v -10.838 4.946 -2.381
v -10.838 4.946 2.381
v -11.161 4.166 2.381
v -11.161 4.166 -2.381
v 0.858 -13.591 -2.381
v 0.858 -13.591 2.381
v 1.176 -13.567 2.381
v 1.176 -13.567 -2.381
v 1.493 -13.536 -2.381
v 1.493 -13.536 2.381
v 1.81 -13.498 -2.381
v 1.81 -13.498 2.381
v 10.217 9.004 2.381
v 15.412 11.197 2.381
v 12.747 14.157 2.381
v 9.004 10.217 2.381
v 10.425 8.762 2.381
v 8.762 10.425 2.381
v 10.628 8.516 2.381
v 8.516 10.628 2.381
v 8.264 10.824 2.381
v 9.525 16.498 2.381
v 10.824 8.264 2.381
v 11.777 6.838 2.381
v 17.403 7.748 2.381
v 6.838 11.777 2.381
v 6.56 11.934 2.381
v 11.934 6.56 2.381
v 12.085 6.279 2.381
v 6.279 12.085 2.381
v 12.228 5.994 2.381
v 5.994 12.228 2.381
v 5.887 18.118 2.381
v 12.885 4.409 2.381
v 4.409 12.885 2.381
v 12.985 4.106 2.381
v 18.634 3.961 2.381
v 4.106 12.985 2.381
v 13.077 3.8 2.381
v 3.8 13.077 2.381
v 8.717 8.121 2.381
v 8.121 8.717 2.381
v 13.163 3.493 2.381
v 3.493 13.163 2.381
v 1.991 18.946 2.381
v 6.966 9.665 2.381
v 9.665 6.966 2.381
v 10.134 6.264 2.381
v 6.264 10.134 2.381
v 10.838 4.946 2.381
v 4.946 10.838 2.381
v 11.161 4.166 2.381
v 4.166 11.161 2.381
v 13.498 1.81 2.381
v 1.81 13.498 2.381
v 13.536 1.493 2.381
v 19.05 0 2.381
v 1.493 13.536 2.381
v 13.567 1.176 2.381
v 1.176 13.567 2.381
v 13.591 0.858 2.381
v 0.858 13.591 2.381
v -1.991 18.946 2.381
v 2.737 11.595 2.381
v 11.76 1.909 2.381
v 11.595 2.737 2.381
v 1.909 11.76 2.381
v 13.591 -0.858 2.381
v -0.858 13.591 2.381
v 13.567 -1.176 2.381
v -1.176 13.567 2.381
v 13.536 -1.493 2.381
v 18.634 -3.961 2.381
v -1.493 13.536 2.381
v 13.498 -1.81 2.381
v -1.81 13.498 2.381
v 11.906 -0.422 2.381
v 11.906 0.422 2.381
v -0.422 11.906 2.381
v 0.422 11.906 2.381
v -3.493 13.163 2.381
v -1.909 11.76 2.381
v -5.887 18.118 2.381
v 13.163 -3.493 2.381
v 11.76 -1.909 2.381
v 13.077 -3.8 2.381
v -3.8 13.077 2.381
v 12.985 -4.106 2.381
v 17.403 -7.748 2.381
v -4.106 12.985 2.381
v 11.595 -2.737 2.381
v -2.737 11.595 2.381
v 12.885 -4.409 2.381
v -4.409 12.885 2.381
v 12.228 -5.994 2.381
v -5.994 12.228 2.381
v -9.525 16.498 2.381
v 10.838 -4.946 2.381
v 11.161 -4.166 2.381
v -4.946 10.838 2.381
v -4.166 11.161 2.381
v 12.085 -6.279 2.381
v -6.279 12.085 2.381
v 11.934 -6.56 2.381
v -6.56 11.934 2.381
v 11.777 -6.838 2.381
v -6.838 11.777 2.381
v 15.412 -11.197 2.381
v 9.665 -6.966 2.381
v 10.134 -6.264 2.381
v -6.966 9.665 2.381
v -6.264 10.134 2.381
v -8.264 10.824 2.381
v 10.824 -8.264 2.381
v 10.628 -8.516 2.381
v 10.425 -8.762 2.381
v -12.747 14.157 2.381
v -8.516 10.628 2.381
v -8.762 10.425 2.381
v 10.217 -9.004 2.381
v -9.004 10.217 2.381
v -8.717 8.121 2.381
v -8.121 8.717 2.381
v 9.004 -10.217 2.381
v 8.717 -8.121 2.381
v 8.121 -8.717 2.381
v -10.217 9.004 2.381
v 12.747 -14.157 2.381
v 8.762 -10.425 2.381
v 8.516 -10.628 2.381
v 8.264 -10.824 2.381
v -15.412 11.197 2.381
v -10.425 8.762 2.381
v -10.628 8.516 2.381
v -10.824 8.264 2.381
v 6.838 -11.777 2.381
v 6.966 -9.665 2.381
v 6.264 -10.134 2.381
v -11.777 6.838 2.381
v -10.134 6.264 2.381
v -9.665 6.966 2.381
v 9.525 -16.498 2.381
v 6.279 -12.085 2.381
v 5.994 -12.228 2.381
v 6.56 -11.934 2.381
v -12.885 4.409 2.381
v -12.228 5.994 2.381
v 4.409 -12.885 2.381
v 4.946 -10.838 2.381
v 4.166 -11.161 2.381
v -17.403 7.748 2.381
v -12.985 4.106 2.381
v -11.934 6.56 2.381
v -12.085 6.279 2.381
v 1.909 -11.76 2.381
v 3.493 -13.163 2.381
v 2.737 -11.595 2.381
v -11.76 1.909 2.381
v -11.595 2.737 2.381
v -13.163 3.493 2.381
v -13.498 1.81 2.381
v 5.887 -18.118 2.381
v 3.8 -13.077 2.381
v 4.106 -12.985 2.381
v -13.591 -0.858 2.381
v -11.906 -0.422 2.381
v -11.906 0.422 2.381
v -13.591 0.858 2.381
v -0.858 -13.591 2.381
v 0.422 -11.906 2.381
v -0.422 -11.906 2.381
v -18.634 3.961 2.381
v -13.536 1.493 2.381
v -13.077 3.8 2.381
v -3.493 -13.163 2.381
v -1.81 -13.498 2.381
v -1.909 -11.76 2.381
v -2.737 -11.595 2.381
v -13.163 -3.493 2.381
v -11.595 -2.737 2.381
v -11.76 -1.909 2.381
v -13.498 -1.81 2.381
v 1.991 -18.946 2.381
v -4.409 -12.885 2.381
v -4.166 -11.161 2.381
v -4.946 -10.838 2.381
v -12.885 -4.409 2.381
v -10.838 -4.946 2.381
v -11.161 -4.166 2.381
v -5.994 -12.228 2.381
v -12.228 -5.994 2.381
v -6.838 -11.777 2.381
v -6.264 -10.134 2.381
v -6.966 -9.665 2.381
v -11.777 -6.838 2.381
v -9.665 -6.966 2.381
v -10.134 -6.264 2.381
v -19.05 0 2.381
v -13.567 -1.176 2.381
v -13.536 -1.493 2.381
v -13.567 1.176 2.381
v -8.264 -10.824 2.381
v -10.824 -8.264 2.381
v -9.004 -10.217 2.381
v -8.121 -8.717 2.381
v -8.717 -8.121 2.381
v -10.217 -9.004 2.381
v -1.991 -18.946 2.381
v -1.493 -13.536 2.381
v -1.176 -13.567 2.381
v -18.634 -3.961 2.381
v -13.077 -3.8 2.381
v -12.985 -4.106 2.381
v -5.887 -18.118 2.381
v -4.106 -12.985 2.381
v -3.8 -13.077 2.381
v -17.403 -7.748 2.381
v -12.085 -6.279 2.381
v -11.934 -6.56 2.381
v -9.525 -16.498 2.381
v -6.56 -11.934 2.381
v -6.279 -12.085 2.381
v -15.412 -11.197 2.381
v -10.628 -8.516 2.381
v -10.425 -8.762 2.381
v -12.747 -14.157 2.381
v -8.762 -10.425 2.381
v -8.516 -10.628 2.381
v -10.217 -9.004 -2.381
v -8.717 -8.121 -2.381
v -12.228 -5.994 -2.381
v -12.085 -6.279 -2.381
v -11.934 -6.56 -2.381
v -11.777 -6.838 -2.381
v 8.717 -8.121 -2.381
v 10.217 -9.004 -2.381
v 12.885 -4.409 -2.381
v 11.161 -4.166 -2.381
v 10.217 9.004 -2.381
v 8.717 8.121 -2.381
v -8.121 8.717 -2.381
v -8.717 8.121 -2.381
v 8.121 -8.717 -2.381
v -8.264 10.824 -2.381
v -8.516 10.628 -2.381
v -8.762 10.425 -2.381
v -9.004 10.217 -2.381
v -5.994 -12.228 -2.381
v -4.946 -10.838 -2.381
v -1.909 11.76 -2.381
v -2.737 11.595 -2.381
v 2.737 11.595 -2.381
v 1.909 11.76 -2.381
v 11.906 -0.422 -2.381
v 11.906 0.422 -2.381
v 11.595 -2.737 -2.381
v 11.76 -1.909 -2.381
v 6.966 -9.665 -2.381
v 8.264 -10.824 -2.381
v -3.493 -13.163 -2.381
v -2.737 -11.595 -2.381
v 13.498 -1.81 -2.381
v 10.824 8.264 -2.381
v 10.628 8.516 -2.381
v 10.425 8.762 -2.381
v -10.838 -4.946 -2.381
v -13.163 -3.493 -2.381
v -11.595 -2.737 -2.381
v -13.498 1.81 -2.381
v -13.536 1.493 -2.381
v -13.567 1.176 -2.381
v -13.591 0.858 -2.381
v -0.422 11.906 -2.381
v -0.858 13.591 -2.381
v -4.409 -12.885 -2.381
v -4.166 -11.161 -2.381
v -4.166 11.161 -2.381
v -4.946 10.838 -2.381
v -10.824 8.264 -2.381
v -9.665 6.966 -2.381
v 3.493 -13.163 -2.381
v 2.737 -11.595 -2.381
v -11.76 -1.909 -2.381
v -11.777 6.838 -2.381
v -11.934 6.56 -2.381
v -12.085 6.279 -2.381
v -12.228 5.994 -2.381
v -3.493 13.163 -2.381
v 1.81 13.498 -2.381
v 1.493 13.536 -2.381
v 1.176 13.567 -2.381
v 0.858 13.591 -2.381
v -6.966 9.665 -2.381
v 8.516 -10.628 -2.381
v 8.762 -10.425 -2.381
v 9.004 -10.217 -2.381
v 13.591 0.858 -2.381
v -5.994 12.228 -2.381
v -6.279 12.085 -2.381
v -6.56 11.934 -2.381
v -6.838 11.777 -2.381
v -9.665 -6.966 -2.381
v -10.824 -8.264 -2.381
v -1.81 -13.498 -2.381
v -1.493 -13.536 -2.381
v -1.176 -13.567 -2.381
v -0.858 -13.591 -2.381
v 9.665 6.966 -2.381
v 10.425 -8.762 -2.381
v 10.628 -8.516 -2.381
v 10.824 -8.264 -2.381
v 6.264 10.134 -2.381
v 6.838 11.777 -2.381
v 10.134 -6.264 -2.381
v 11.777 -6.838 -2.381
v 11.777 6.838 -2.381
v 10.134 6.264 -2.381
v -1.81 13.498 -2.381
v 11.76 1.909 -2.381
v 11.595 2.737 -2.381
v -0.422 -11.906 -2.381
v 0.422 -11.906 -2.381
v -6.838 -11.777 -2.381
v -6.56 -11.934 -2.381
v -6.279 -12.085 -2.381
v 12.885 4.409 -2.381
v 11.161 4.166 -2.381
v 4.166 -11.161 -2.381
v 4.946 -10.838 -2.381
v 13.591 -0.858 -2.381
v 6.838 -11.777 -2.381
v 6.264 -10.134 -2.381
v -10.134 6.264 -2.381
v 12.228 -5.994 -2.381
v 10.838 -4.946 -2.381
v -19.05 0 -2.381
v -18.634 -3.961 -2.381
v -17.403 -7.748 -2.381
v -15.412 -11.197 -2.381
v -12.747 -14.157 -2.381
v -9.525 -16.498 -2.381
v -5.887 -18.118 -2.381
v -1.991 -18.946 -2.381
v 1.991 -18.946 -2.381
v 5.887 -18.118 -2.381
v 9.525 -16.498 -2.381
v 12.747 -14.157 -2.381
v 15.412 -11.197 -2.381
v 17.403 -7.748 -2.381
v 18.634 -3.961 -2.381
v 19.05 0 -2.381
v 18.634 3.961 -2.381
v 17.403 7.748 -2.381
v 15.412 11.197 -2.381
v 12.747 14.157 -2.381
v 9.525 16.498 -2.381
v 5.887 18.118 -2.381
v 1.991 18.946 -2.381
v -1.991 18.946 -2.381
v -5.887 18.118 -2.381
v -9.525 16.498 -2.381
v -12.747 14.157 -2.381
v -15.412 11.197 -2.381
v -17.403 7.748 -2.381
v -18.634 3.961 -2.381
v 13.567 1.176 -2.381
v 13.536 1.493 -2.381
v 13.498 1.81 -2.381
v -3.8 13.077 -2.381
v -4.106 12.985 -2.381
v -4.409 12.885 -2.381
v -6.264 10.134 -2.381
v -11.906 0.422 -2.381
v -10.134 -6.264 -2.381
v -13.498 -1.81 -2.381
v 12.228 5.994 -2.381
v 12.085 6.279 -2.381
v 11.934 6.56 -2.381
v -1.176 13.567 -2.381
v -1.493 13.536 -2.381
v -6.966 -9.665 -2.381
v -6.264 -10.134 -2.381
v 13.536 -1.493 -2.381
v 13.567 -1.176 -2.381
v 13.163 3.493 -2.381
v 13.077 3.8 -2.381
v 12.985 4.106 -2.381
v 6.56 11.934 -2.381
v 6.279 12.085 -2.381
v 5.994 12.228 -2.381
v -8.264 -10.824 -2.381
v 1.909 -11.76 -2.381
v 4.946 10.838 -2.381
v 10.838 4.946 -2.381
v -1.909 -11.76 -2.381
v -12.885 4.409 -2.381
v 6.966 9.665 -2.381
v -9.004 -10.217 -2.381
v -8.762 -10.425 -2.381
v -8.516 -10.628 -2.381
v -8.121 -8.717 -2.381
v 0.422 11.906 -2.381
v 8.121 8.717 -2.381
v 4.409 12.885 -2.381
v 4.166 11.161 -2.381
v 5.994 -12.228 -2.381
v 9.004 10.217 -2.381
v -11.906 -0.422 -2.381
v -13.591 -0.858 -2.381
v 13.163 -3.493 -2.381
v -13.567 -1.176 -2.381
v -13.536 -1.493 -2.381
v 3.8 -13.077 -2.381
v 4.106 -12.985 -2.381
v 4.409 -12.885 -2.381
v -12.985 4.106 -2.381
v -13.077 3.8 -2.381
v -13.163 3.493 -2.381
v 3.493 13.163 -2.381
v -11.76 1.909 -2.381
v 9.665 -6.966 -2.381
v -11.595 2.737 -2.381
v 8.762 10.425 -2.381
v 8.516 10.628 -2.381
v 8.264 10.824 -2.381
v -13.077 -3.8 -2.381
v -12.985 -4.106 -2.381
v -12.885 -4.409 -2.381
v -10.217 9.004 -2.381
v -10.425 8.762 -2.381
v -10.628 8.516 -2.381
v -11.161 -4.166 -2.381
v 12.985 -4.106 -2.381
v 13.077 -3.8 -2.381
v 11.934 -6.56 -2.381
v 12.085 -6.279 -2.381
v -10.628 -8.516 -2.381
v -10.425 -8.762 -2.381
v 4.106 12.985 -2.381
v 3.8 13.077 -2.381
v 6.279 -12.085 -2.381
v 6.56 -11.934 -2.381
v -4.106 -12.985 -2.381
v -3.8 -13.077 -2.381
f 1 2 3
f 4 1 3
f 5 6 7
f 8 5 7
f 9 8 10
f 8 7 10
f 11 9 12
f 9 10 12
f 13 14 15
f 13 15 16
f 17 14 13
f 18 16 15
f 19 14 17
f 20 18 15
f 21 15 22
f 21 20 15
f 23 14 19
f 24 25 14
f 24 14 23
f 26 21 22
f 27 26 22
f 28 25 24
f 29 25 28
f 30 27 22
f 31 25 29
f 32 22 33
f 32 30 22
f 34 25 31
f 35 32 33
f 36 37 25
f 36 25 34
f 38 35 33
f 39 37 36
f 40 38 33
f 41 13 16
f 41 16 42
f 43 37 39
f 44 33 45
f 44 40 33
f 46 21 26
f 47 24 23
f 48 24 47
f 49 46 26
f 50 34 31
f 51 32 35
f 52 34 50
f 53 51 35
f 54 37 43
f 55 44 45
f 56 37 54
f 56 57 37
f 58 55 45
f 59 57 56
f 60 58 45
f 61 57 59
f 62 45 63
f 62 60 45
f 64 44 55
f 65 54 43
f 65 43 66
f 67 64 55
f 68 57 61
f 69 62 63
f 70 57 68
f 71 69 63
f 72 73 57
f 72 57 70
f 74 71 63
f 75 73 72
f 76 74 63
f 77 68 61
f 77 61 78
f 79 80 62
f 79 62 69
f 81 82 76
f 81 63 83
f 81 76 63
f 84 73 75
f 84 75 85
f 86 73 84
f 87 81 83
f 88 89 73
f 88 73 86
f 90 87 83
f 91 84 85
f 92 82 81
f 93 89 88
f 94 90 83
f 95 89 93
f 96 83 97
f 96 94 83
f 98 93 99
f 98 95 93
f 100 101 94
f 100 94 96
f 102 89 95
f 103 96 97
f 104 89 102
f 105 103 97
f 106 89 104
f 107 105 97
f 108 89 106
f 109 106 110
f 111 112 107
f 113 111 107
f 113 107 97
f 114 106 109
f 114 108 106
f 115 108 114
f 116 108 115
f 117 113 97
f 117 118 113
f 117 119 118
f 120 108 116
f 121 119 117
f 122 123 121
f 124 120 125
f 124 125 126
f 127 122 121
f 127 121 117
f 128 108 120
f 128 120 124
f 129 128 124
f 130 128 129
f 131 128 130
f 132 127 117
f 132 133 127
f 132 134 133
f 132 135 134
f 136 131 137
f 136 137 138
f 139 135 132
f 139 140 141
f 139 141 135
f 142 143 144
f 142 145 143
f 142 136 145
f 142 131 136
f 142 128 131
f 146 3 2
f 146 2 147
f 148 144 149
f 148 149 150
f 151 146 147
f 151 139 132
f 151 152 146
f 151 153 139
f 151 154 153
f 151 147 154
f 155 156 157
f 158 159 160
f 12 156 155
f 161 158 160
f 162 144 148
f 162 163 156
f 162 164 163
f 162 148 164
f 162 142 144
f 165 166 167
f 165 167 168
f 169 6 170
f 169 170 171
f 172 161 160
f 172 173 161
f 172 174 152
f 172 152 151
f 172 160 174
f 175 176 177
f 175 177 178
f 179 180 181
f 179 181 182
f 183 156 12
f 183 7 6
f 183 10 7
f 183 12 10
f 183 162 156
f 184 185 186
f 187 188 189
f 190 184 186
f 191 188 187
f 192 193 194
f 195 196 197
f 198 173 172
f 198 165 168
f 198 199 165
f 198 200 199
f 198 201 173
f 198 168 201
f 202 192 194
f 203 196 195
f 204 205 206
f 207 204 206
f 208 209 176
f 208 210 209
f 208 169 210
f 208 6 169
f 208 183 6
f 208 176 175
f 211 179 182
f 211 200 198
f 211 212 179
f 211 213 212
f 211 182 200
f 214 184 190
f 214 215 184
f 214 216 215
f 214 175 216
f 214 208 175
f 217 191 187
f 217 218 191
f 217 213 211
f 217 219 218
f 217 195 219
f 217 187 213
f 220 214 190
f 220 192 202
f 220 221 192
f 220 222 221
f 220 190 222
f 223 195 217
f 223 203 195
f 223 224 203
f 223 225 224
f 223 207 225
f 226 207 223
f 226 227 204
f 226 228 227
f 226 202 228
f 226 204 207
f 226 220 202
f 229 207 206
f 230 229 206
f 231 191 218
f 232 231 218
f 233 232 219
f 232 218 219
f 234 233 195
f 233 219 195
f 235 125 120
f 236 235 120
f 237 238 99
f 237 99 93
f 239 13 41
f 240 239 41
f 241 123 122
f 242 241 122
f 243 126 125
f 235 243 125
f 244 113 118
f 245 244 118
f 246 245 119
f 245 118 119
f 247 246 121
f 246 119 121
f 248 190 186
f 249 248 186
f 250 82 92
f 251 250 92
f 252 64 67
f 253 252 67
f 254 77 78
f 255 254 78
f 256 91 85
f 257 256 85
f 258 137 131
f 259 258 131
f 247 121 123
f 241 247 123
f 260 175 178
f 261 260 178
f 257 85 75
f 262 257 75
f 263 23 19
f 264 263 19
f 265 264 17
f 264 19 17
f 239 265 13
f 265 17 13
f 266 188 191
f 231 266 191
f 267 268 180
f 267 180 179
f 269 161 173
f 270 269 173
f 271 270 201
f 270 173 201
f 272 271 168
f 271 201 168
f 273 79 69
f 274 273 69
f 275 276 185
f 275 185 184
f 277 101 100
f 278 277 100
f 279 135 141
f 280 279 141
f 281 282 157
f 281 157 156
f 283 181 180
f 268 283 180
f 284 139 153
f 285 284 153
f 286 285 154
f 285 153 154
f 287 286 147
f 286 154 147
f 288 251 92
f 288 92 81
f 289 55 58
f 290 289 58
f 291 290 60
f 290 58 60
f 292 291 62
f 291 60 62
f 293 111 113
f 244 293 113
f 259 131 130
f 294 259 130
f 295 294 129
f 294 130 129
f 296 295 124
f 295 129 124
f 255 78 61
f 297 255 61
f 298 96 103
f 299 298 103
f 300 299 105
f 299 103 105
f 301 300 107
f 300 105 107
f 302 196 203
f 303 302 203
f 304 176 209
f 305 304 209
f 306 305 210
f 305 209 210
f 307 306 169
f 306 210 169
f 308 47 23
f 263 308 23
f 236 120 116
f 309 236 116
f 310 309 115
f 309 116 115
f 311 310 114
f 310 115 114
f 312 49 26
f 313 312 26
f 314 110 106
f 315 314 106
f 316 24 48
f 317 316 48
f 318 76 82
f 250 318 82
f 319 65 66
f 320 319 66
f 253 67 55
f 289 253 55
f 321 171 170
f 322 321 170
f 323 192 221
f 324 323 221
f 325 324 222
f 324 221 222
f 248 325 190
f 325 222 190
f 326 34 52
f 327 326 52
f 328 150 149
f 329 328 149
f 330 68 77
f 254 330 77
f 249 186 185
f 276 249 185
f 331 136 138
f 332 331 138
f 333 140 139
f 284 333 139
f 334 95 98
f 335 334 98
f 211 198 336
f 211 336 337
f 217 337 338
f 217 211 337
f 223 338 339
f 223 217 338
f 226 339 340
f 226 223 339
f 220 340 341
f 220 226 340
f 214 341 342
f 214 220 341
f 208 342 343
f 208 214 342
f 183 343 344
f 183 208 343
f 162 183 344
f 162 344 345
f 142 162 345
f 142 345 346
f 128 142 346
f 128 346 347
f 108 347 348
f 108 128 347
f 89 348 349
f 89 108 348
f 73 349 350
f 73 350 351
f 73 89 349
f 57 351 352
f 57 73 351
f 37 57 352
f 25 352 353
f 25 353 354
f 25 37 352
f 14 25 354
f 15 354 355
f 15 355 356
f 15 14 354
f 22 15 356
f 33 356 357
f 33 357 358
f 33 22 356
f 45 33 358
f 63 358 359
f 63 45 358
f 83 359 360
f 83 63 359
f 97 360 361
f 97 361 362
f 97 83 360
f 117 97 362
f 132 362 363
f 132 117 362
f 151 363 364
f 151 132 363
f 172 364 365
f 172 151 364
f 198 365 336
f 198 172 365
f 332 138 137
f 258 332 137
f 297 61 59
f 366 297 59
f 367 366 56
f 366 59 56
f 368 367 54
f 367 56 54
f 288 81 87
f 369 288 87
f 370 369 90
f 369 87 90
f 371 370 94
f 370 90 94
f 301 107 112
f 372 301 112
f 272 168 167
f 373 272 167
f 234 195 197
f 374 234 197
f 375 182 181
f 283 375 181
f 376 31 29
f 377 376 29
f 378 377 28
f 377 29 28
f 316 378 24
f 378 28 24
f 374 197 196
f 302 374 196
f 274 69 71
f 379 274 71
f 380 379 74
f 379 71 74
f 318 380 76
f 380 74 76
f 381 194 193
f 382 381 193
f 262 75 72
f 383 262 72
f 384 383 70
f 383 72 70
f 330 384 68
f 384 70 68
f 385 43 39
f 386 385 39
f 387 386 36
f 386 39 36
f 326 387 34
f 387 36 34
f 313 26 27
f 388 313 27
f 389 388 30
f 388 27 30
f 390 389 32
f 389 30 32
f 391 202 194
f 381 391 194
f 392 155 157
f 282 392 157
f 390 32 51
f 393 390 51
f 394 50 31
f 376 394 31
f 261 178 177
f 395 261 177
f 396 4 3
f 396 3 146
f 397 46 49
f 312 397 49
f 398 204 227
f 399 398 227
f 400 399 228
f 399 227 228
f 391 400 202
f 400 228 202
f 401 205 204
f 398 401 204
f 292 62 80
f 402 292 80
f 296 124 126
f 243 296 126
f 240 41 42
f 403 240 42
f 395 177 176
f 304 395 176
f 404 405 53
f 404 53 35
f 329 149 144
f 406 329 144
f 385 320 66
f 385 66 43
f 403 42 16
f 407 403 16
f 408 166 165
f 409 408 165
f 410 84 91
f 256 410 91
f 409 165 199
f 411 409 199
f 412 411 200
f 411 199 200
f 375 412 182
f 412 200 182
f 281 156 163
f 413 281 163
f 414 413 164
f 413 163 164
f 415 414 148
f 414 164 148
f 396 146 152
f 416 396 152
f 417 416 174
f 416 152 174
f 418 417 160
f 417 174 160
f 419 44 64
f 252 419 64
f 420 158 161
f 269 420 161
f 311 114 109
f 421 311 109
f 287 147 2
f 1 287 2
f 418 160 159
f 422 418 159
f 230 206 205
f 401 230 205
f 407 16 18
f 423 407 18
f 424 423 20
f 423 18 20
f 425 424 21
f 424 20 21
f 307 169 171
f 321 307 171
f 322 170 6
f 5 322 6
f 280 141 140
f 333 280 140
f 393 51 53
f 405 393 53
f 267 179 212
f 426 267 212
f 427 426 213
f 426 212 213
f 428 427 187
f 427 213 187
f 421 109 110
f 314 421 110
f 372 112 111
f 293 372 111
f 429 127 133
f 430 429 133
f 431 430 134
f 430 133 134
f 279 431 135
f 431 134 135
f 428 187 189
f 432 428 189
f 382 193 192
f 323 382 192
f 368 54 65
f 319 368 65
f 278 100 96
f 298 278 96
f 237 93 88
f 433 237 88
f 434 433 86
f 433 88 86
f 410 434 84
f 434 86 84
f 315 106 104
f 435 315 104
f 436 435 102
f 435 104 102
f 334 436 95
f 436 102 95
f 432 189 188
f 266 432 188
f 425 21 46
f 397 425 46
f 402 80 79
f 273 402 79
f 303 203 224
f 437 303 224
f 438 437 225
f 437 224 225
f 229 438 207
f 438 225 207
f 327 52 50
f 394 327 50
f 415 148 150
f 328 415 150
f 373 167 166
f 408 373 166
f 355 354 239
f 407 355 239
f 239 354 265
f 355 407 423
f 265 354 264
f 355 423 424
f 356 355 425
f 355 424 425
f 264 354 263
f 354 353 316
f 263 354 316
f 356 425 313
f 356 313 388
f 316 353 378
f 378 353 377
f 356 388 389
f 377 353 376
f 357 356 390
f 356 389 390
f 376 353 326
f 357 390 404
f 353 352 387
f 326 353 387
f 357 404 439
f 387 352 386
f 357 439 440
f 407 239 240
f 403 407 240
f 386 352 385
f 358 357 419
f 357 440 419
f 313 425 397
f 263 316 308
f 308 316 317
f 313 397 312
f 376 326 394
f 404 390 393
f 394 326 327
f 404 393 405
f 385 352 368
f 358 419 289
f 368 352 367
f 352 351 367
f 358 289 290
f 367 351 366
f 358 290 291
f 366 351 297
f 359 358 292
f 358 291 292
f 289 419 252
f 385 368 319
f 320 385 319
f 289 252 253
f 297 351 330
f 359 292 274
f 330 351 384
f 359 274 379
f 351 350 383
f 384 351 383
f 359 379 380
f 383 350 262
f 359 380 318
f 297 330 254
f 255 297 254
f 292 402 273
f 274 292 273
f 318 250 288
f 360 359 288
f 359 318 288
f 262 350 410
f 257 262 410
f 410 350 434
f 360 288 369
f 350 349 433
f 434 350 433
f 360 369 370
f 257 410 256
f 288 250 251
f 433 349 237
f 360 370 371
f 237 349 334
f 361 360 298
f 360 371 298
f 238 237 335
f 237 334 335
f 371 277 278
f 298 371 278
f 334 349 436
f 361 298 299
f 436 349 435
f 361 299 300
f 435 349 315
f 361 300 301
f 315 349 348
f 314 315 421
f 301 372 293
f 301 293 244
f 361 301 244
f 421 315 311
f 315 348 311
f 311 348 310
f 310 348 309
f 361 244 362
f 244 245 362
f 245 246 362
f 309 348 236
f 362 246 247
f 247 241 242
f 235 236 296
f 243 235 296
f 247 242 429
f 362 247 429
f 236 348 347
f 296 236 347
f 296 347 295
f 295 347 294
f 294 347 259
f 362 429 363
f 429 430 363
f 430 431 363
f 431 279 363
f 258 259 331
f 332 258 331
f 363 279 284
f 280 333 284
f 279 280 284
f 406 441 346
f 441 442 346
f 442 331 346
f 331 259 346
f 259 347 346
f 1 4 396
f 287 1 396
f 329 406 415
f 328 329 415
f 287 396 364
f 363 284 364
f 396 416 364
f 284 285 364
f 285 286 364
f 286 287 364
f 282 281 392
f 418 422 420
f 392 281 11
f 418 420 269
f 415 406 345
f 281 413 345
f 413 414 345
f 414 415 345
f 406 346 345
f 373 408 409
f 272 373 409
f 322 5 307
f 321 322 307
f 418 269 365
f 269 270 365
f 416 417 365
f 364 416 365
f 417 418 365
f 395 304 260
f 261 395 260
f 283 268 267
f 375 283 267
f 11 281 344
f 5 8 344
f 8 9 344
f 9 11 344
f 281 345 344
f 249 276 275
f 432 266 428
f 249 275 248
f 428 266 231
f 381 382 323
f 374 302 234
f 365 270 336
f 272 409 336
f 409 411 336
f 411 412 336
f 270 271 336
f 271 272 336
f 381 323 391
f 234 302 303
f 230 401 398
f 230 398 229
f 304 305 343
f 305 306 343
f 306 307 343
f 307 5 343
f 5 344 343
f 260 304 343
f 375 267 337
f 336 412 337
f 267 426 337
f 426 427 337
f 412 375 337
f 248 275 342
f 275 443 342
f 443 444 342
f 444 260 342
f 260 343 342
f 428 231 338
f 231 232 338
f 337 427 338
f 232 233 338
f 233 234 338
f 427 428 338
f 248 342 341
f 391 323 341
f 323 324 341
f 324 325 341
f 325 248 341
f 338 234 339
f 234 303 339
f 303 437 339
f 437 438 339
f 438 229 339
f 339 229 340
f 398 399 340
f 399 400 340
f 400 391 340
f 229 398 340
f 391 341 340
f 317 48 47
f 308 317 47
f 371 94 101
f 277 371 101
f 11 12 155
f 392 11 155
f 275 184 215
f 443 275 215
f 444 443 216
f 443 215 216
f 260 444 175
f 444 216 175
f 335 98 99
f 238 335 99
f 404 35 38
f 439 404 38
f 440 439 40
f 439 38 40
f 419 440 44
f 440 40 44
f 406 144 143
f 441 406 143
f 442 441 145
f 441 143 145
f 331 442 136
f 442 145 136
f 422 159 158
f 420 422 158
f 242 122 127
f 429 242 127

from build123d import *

# Parameters (mm, degrees)
SKETCH1_R           = 19.05
BOSS_EXTRUDE1_DEPTH = 4.7625


# Read off the part's stored shape, not the designer's step: Imported1
with BuildPart() as part:
    # Sketch1 → Boss-Extrude1 (new body)
    with BuildSketch(Plane.XY.offset(2.38125)):
        with Locations(Location((0, 0, 0), (0, 0, 180))):
            Circle(SKETCH1_R)
        with BuildLine():
            Line((1.908812995, 11.759820716), (1.810138608, 13.497531825))
            ThreePointArc((1.810138608, 13.497531825), (1.334833561, 13.552792572), (0.857880531, 13.591321069))
            Line((0.857880531, 13.591321069), (0.422091522, 11.90625))
            Line((0.422091522, 11.90625), (-0.422091522, 11.90625))
            Line((-0.422091522, 11.90625), (-0.857880531, 13.591321069))
            ThreePointArc((-0.857880531, 13.591321069), (-1.334833561, 13.552792582), (-1.810138607, 13.497531835))
            Line((-1.810138607, 13.497531835), (-1.908812995, 11.759820716))
            Line((-1.908812995, 11.759820716), (-2.736775298, 11.595128774))
            Line((-2.736775298, 11.595128774), (-3.492931801, 13.162803457))
            ThreePointArc((-3.492931801, 13.162803457), (-3.953203777, 13.031966364), (-4.408595133, 12.885040022))
            Line((-4.408595133, 12.885040022), (-4.166362899, 11.161468116))
            Line((-4.166362899, 11.161468116), (-4.946286334, 10.838413252))
            Line((-4.946286334, 10.838413252), (-5.993751661, 12.228446689))
            ThreePointArc((-5.993751661, 12.228446689), (-6.41965459, 12.010328986), (-6.837631821, 11.777383347))
            Line((-6.837631821, 11.777383347), (-6.263801813, 10.134186556))
            Line((-6.263801813, 10.134186556), (-6.965714361, 9.665183587))
            Line((-6.965714361, 9.665183587), (-8.264235006, 10.824157574))
            ThreePointArc((-8.264235006, 10.824157574), (-8.639401676, 10.527141401), (-9.003902152, 10.217128434))
            Line((-9.003902152, 10.217128434), (-8.120526336, 8.717453891))
            Line((-8.120526336, 8.717453891), (-8.717453891, 8.120526336))
            Line((-8.717453891, 8.120526336), (-10.217128434, 9.003902152))
            ThreePointArc((-10.217128434, 9.003902152), (-10.527141401, 8.639401676), (-10.824157574, 8.264235006))
            Line((-10.824157574, 8.264235006), (-9.665183587, 6.965714361))
            Line((-9.665183587, 6.965714361), (-10.134186556, 6.263801813))
            Line((-10.134186556, 6.263801813), (-11.777383347, 6.837631821))
            ThreePointArc((-11.777383347, 6.837631821), (-12.010328986, 6.41965459), (-12.228446689, 5.993751661))
            Line((-12.228446689, 5.993751661), (-10.838413252, 4.946286334))
            Line((-10.838413252, 4.946286334), (-11.161468116, 4.166362899))
            Line((-11.161468116, 4.166362899), (-12.885040022, 4.408595133))
            ThreePointArc((-12.885040022, 4.408595133), (-13.031966364, 3.953203777), (-13.162803457, 3.492931801))
            Line((-13.162803457, 3.492931801), (-11.595128774, 2.736775298))
            Line((-11.595128774, 2.736775298), (-11.759820716, 1.908812995))
            Line((-11.759820716, 1.908812995), (-13.497531835, 1.810138607))
            ThreePointArc((-13.497531835, 1.810138607), (-13.552792582, 1.334833561), (-13.591321069, 0.857880531))
            Line((-13.591321069, 0.857880531), (-11.90625, 0.422091522))
            Line((-11.90625, 0.422091522), (-11.90625, -0.422091522))
            Line((-11.90625, -0.422091522), (-13.591321069, -0.857880531))
            ThreePointArc((-13.591321069, -0.857880531), (-13.552792582, -1.334833561), (-13.497531835, -1.810138607))
            Line((-13.497531835, -1.810138607), (-11.759820716, -1.908812995))
            Line((-11.759820716, -1.908812995), (-11.595128774, -2.736775298))
            Line((-11.595128774, -2.736775298), (-13.162803457, -3.492931801))
            ThreePointArc((-13.162803457, -3.492931801), (-13.031966364, -3.953203777), (-12.885040022, -4.408595133))
            Line((-12.885040022, -4.408595133), (-11.161468116, -4.166362899))
            Line((-11.161468116, -4.166362899), (-10.838413252, -4.946286334))
            Line((-10.838413252, -4.946286334), (-12.228446689, -5.993751661))
            ThreePointArc((-12.228446689, -5.993751661), (-12.010328986, -6.41965459), (-11.777383347, -6.837631821))
            Line((-11.777383347, -6.837631821), (-10.134186556, -6.263801813))
            Line((-10.134186556, -6.263801813), (-9.665183587, -6.965714361))
            Line((-9.665183587, -6.965714361), (-10.824157574, -8.264235006))
            ThreePointArc((-10.824157574, -8.264235006), (-10.527141401, -8.639401676), (-10.217128434, -9.003902152))
            Line((-10.217128434, -9.003902152), (-8.717453891, -8.120526336))
            Line((-8.717453891, -8.120526336), (-8.120526336, -8.717453891))
            Line((-8.120526336, -8.717453891), (-9.003902152, -10.217128434))
            ThreePointArc((-9.003902152, -10.217128434), (-8.639401676, -10.527141401), (-8.264235006, -10.824157574))
            Line((-8.264235006, -10.824157574), (-6.965714361, -9.665183587))
            Line((-6.965714361, -9.665183587), (-6.263801813, -10.134186556))
            Line((-6.263801813, -10.134186556), (-6.837631821, -11.777383347))
            ThreePointArc((-6.837631821, -11.777383347), (-6.41965459, -12.010328986), (-5.993751661, -12.228446689))
            Line((-5.993751661, -12.228446689), (-4.946286334, -10.838413252))
            Line((-4.946286334, -10.838413252), (-4.166362899, -11.161468116))
            Line((-4.166362899, -11.161468116), (-4.408595133, -12.885040022))
            ThreePointArc((-4.408595133, -12.885040022), (-3.953203777, -13.031966364), (-3.492931801, -13.162803457))
            Line((-3.492931801, -13.162803457), (-2.736775298, -11.595128774))
            Line((-2.736775298, -11.595128774), (-1.908812995, -11.759820716))
            Line((-1.908812995, -11.759820716), (-1.810138607, -13.497531835))
            ThreePointArc((-1.810138607, -13.497531835), (-1.334833561, -13.552792582), (-0.857880531, -13.591321069))
            Line((-0.857880531, -13.591321069), (-0.422091522, -11.90625))
            Line((-0.422091522, -11.90625), (0.422091522, -11.90625))
            Line((0.422091522, -11.90625), (0.857880531, -13.591321069))
            ThreePointArc((0.857880531, -13.591321069), (1.334833561, -13.552792582), (1.810138607, -13.497531835))
            Line((1.810138607, -13.497531835), (1.908812995, -11.759820716))
            Line((1.908812995, -11.759820716), (2.736775298, -11.595128774))
            Line((2.736775298, -11.595128774), (3.492931801, -13.162803457))
            ThreePointArc((3.492931801, -13.162803457), (3.953203777, -13.031966364), (4.408595133, -12.885040022))
            Line((4.408595133, -12.885040022), (4.166362899, -11.161468116))
            Line((4.166362899, -11.161468116), (4.946286334, -10.838413252))
            Line((4.946286334, -10.838413252), (5.993751661, -12.228446689))
            ThreePointArc((5.993751661, -12.228446689), (6.41965459, -12.010328986), (6.837631821, -11.777383347))
            Line((6.837631821, -11.777383347), (6.263801813, -10.134186556))
            Line((6.263801813, -10.134186556), (6.965714361, -9.665183587))
            Line((6.965714361, -9.665183587), (8.264235006, -10.824157574))
            ThreePointArc((8.264235006, -10.824157574), (8.639401676, -10.527141401), (9.003902152, -10.217128434))
            Line((9.003902152, -10.217128434), (8.120526336, -8.717453891))
            Line((8.120526336, -8.717453891), (8.717453891, -8.120526336))
            Line((8.717453891, -8.120526336), (10.217128434, -9.003902152))
            ThreePointArc((10.217128434, -9.003902152), (10.527141401, -8.639401676), (10.824157574, -8.264235006))
            Line((10.824157574, -8.264235006), (9.665183587, -6.965714361))
            Line((9.665183587, -6.965714361), (10.134186556, -6.263801813))
            Line((10.134186556, -6.263801813), (11.777383347, -6.837631821))
            ThreePointArc((11.777383347, -6.837631821), (12.010328986, -6.41965459), (12.228446689, -5.993751661))
            Line((12.228446689, -5.993751661), (10.838413252, -4.946286334))
            Line((10.838413252, -4.946286334), (11.161468116, -4.166362899))
            Line((11.161468116, -4.166362899), (12.885040022, -4.408595133))
            ThreePointArc((12.885040022, -4.408595133), (13.031966364, -3.953203777), (13.162803457, -3.492931801))
            Line((13.162803457, -3.492931801), (11.595128774, -2.736775298))
            Line((11.595128774, -2.736775298), (11.759820716, -1.908812995))
            Line((11.759820716, -1.908812995), (13.497531835, -1.810138607))
            ThreePointArc((13.497531835, -1.810138607), (13.552792582, -1.334833561), (13.591321069, -0.857880531))
            Line((13.591321069, -0.857880531), (11.90625, -0.422091522))
            Line((11.90625, -0.422091522), (11.90625, 0.422091522))
            Line((11.90625, 0.422091522), (13.591321069, 0.857880531))
            ThreePointArc((13.591321069, 0.857880531), (13.552792582, 1.334833561), (13.497531835, 1.810138607))
            Line((13.497531835, 1.810138607), (11.759820716, 1.908812995))
            Line((11.759820716, 1.908812995), (11.595128774, 2.736775298))
            Line((11.595128774, 2.736775298), (13.162803457, 3.492931801))
            ThreePointArc((13.162803457, 3.492931801), (13.031966364, 3.953203777), (12.885040022, 4.408595133))
            Line((12.885040022, 4.408595133), (11.161468116, 4.166362899))
            Line((11.161468116, 4.166362899), (10.838413252, 4.946286334))
            Line((10.838413252, 4.946286334), (12.228446689, 5.993751661))
            ThreePointArc((12.228446689, 5.993751661), (12.010328986, 6.41965459), (11.777383347, 6.837631821))
            Line((11.777383347, 6.837631821), (10.134186556, 6.263801813))
            Line((10.134186556, 6.263801813), (9.665183587, 6.965714361))
            Line((9.665183587, 6.965714361), (10.824157574, 8.264235006))
            ThreePointArc((10.824157574, 8.264235006), (10.527141401, 8.639401676), (10.217128434, 9.003902152))
            Line((10.217128434, 9.003902152), (8.717453891, 8.120526336))
            Line((8.717453891, 8.120526336), (8.120526336, 8.717453891))
            Line((8.120526336, 8.717453891), (9.003902152, 10.217128434))
            ThreePointArc((9.003902152, 10.217128434), (8.639401676, 10.527141401), (8.264235006, 10.824157574))
            Line((8.264235006, 10.824157574), (6.965714361, 9.665183587))
            Line((6.965714361, 9.665183587), (6.263801813, 10.134186556))
            Line((6.263801813, 10.134186556), (6.837631821, 11.777383347))
            ThreePointArc((6.837631821, 11.777383347), (6.41965459, 12.010328986), (5.993751661, 12.228446689))
            Line((5.993751661, 12.228446689), (4.946286334, 10.838413252))
            Line((4.946286334, 10.838413252), (4.166362899, 11.161468116))
            Line((4.166362899, 11.161468116), (4.408595133, 12.885040022))
            ThreePointArc((4.408595133, 12.885040022), (3.953203777, 13.031966364), (3.492931801, 13.162803457))
            Line((3.492931801, 13.162803457), (2.736775298, 11.595128774))
            Line((2.736775298, 11.595128774), (1.908812995, 11.759820716))
        make_face(mode=Mode.SUBTRACT)
    extrude(amount=-BOSS_EXTRUDE1_DEPTH)


solid = part.part
